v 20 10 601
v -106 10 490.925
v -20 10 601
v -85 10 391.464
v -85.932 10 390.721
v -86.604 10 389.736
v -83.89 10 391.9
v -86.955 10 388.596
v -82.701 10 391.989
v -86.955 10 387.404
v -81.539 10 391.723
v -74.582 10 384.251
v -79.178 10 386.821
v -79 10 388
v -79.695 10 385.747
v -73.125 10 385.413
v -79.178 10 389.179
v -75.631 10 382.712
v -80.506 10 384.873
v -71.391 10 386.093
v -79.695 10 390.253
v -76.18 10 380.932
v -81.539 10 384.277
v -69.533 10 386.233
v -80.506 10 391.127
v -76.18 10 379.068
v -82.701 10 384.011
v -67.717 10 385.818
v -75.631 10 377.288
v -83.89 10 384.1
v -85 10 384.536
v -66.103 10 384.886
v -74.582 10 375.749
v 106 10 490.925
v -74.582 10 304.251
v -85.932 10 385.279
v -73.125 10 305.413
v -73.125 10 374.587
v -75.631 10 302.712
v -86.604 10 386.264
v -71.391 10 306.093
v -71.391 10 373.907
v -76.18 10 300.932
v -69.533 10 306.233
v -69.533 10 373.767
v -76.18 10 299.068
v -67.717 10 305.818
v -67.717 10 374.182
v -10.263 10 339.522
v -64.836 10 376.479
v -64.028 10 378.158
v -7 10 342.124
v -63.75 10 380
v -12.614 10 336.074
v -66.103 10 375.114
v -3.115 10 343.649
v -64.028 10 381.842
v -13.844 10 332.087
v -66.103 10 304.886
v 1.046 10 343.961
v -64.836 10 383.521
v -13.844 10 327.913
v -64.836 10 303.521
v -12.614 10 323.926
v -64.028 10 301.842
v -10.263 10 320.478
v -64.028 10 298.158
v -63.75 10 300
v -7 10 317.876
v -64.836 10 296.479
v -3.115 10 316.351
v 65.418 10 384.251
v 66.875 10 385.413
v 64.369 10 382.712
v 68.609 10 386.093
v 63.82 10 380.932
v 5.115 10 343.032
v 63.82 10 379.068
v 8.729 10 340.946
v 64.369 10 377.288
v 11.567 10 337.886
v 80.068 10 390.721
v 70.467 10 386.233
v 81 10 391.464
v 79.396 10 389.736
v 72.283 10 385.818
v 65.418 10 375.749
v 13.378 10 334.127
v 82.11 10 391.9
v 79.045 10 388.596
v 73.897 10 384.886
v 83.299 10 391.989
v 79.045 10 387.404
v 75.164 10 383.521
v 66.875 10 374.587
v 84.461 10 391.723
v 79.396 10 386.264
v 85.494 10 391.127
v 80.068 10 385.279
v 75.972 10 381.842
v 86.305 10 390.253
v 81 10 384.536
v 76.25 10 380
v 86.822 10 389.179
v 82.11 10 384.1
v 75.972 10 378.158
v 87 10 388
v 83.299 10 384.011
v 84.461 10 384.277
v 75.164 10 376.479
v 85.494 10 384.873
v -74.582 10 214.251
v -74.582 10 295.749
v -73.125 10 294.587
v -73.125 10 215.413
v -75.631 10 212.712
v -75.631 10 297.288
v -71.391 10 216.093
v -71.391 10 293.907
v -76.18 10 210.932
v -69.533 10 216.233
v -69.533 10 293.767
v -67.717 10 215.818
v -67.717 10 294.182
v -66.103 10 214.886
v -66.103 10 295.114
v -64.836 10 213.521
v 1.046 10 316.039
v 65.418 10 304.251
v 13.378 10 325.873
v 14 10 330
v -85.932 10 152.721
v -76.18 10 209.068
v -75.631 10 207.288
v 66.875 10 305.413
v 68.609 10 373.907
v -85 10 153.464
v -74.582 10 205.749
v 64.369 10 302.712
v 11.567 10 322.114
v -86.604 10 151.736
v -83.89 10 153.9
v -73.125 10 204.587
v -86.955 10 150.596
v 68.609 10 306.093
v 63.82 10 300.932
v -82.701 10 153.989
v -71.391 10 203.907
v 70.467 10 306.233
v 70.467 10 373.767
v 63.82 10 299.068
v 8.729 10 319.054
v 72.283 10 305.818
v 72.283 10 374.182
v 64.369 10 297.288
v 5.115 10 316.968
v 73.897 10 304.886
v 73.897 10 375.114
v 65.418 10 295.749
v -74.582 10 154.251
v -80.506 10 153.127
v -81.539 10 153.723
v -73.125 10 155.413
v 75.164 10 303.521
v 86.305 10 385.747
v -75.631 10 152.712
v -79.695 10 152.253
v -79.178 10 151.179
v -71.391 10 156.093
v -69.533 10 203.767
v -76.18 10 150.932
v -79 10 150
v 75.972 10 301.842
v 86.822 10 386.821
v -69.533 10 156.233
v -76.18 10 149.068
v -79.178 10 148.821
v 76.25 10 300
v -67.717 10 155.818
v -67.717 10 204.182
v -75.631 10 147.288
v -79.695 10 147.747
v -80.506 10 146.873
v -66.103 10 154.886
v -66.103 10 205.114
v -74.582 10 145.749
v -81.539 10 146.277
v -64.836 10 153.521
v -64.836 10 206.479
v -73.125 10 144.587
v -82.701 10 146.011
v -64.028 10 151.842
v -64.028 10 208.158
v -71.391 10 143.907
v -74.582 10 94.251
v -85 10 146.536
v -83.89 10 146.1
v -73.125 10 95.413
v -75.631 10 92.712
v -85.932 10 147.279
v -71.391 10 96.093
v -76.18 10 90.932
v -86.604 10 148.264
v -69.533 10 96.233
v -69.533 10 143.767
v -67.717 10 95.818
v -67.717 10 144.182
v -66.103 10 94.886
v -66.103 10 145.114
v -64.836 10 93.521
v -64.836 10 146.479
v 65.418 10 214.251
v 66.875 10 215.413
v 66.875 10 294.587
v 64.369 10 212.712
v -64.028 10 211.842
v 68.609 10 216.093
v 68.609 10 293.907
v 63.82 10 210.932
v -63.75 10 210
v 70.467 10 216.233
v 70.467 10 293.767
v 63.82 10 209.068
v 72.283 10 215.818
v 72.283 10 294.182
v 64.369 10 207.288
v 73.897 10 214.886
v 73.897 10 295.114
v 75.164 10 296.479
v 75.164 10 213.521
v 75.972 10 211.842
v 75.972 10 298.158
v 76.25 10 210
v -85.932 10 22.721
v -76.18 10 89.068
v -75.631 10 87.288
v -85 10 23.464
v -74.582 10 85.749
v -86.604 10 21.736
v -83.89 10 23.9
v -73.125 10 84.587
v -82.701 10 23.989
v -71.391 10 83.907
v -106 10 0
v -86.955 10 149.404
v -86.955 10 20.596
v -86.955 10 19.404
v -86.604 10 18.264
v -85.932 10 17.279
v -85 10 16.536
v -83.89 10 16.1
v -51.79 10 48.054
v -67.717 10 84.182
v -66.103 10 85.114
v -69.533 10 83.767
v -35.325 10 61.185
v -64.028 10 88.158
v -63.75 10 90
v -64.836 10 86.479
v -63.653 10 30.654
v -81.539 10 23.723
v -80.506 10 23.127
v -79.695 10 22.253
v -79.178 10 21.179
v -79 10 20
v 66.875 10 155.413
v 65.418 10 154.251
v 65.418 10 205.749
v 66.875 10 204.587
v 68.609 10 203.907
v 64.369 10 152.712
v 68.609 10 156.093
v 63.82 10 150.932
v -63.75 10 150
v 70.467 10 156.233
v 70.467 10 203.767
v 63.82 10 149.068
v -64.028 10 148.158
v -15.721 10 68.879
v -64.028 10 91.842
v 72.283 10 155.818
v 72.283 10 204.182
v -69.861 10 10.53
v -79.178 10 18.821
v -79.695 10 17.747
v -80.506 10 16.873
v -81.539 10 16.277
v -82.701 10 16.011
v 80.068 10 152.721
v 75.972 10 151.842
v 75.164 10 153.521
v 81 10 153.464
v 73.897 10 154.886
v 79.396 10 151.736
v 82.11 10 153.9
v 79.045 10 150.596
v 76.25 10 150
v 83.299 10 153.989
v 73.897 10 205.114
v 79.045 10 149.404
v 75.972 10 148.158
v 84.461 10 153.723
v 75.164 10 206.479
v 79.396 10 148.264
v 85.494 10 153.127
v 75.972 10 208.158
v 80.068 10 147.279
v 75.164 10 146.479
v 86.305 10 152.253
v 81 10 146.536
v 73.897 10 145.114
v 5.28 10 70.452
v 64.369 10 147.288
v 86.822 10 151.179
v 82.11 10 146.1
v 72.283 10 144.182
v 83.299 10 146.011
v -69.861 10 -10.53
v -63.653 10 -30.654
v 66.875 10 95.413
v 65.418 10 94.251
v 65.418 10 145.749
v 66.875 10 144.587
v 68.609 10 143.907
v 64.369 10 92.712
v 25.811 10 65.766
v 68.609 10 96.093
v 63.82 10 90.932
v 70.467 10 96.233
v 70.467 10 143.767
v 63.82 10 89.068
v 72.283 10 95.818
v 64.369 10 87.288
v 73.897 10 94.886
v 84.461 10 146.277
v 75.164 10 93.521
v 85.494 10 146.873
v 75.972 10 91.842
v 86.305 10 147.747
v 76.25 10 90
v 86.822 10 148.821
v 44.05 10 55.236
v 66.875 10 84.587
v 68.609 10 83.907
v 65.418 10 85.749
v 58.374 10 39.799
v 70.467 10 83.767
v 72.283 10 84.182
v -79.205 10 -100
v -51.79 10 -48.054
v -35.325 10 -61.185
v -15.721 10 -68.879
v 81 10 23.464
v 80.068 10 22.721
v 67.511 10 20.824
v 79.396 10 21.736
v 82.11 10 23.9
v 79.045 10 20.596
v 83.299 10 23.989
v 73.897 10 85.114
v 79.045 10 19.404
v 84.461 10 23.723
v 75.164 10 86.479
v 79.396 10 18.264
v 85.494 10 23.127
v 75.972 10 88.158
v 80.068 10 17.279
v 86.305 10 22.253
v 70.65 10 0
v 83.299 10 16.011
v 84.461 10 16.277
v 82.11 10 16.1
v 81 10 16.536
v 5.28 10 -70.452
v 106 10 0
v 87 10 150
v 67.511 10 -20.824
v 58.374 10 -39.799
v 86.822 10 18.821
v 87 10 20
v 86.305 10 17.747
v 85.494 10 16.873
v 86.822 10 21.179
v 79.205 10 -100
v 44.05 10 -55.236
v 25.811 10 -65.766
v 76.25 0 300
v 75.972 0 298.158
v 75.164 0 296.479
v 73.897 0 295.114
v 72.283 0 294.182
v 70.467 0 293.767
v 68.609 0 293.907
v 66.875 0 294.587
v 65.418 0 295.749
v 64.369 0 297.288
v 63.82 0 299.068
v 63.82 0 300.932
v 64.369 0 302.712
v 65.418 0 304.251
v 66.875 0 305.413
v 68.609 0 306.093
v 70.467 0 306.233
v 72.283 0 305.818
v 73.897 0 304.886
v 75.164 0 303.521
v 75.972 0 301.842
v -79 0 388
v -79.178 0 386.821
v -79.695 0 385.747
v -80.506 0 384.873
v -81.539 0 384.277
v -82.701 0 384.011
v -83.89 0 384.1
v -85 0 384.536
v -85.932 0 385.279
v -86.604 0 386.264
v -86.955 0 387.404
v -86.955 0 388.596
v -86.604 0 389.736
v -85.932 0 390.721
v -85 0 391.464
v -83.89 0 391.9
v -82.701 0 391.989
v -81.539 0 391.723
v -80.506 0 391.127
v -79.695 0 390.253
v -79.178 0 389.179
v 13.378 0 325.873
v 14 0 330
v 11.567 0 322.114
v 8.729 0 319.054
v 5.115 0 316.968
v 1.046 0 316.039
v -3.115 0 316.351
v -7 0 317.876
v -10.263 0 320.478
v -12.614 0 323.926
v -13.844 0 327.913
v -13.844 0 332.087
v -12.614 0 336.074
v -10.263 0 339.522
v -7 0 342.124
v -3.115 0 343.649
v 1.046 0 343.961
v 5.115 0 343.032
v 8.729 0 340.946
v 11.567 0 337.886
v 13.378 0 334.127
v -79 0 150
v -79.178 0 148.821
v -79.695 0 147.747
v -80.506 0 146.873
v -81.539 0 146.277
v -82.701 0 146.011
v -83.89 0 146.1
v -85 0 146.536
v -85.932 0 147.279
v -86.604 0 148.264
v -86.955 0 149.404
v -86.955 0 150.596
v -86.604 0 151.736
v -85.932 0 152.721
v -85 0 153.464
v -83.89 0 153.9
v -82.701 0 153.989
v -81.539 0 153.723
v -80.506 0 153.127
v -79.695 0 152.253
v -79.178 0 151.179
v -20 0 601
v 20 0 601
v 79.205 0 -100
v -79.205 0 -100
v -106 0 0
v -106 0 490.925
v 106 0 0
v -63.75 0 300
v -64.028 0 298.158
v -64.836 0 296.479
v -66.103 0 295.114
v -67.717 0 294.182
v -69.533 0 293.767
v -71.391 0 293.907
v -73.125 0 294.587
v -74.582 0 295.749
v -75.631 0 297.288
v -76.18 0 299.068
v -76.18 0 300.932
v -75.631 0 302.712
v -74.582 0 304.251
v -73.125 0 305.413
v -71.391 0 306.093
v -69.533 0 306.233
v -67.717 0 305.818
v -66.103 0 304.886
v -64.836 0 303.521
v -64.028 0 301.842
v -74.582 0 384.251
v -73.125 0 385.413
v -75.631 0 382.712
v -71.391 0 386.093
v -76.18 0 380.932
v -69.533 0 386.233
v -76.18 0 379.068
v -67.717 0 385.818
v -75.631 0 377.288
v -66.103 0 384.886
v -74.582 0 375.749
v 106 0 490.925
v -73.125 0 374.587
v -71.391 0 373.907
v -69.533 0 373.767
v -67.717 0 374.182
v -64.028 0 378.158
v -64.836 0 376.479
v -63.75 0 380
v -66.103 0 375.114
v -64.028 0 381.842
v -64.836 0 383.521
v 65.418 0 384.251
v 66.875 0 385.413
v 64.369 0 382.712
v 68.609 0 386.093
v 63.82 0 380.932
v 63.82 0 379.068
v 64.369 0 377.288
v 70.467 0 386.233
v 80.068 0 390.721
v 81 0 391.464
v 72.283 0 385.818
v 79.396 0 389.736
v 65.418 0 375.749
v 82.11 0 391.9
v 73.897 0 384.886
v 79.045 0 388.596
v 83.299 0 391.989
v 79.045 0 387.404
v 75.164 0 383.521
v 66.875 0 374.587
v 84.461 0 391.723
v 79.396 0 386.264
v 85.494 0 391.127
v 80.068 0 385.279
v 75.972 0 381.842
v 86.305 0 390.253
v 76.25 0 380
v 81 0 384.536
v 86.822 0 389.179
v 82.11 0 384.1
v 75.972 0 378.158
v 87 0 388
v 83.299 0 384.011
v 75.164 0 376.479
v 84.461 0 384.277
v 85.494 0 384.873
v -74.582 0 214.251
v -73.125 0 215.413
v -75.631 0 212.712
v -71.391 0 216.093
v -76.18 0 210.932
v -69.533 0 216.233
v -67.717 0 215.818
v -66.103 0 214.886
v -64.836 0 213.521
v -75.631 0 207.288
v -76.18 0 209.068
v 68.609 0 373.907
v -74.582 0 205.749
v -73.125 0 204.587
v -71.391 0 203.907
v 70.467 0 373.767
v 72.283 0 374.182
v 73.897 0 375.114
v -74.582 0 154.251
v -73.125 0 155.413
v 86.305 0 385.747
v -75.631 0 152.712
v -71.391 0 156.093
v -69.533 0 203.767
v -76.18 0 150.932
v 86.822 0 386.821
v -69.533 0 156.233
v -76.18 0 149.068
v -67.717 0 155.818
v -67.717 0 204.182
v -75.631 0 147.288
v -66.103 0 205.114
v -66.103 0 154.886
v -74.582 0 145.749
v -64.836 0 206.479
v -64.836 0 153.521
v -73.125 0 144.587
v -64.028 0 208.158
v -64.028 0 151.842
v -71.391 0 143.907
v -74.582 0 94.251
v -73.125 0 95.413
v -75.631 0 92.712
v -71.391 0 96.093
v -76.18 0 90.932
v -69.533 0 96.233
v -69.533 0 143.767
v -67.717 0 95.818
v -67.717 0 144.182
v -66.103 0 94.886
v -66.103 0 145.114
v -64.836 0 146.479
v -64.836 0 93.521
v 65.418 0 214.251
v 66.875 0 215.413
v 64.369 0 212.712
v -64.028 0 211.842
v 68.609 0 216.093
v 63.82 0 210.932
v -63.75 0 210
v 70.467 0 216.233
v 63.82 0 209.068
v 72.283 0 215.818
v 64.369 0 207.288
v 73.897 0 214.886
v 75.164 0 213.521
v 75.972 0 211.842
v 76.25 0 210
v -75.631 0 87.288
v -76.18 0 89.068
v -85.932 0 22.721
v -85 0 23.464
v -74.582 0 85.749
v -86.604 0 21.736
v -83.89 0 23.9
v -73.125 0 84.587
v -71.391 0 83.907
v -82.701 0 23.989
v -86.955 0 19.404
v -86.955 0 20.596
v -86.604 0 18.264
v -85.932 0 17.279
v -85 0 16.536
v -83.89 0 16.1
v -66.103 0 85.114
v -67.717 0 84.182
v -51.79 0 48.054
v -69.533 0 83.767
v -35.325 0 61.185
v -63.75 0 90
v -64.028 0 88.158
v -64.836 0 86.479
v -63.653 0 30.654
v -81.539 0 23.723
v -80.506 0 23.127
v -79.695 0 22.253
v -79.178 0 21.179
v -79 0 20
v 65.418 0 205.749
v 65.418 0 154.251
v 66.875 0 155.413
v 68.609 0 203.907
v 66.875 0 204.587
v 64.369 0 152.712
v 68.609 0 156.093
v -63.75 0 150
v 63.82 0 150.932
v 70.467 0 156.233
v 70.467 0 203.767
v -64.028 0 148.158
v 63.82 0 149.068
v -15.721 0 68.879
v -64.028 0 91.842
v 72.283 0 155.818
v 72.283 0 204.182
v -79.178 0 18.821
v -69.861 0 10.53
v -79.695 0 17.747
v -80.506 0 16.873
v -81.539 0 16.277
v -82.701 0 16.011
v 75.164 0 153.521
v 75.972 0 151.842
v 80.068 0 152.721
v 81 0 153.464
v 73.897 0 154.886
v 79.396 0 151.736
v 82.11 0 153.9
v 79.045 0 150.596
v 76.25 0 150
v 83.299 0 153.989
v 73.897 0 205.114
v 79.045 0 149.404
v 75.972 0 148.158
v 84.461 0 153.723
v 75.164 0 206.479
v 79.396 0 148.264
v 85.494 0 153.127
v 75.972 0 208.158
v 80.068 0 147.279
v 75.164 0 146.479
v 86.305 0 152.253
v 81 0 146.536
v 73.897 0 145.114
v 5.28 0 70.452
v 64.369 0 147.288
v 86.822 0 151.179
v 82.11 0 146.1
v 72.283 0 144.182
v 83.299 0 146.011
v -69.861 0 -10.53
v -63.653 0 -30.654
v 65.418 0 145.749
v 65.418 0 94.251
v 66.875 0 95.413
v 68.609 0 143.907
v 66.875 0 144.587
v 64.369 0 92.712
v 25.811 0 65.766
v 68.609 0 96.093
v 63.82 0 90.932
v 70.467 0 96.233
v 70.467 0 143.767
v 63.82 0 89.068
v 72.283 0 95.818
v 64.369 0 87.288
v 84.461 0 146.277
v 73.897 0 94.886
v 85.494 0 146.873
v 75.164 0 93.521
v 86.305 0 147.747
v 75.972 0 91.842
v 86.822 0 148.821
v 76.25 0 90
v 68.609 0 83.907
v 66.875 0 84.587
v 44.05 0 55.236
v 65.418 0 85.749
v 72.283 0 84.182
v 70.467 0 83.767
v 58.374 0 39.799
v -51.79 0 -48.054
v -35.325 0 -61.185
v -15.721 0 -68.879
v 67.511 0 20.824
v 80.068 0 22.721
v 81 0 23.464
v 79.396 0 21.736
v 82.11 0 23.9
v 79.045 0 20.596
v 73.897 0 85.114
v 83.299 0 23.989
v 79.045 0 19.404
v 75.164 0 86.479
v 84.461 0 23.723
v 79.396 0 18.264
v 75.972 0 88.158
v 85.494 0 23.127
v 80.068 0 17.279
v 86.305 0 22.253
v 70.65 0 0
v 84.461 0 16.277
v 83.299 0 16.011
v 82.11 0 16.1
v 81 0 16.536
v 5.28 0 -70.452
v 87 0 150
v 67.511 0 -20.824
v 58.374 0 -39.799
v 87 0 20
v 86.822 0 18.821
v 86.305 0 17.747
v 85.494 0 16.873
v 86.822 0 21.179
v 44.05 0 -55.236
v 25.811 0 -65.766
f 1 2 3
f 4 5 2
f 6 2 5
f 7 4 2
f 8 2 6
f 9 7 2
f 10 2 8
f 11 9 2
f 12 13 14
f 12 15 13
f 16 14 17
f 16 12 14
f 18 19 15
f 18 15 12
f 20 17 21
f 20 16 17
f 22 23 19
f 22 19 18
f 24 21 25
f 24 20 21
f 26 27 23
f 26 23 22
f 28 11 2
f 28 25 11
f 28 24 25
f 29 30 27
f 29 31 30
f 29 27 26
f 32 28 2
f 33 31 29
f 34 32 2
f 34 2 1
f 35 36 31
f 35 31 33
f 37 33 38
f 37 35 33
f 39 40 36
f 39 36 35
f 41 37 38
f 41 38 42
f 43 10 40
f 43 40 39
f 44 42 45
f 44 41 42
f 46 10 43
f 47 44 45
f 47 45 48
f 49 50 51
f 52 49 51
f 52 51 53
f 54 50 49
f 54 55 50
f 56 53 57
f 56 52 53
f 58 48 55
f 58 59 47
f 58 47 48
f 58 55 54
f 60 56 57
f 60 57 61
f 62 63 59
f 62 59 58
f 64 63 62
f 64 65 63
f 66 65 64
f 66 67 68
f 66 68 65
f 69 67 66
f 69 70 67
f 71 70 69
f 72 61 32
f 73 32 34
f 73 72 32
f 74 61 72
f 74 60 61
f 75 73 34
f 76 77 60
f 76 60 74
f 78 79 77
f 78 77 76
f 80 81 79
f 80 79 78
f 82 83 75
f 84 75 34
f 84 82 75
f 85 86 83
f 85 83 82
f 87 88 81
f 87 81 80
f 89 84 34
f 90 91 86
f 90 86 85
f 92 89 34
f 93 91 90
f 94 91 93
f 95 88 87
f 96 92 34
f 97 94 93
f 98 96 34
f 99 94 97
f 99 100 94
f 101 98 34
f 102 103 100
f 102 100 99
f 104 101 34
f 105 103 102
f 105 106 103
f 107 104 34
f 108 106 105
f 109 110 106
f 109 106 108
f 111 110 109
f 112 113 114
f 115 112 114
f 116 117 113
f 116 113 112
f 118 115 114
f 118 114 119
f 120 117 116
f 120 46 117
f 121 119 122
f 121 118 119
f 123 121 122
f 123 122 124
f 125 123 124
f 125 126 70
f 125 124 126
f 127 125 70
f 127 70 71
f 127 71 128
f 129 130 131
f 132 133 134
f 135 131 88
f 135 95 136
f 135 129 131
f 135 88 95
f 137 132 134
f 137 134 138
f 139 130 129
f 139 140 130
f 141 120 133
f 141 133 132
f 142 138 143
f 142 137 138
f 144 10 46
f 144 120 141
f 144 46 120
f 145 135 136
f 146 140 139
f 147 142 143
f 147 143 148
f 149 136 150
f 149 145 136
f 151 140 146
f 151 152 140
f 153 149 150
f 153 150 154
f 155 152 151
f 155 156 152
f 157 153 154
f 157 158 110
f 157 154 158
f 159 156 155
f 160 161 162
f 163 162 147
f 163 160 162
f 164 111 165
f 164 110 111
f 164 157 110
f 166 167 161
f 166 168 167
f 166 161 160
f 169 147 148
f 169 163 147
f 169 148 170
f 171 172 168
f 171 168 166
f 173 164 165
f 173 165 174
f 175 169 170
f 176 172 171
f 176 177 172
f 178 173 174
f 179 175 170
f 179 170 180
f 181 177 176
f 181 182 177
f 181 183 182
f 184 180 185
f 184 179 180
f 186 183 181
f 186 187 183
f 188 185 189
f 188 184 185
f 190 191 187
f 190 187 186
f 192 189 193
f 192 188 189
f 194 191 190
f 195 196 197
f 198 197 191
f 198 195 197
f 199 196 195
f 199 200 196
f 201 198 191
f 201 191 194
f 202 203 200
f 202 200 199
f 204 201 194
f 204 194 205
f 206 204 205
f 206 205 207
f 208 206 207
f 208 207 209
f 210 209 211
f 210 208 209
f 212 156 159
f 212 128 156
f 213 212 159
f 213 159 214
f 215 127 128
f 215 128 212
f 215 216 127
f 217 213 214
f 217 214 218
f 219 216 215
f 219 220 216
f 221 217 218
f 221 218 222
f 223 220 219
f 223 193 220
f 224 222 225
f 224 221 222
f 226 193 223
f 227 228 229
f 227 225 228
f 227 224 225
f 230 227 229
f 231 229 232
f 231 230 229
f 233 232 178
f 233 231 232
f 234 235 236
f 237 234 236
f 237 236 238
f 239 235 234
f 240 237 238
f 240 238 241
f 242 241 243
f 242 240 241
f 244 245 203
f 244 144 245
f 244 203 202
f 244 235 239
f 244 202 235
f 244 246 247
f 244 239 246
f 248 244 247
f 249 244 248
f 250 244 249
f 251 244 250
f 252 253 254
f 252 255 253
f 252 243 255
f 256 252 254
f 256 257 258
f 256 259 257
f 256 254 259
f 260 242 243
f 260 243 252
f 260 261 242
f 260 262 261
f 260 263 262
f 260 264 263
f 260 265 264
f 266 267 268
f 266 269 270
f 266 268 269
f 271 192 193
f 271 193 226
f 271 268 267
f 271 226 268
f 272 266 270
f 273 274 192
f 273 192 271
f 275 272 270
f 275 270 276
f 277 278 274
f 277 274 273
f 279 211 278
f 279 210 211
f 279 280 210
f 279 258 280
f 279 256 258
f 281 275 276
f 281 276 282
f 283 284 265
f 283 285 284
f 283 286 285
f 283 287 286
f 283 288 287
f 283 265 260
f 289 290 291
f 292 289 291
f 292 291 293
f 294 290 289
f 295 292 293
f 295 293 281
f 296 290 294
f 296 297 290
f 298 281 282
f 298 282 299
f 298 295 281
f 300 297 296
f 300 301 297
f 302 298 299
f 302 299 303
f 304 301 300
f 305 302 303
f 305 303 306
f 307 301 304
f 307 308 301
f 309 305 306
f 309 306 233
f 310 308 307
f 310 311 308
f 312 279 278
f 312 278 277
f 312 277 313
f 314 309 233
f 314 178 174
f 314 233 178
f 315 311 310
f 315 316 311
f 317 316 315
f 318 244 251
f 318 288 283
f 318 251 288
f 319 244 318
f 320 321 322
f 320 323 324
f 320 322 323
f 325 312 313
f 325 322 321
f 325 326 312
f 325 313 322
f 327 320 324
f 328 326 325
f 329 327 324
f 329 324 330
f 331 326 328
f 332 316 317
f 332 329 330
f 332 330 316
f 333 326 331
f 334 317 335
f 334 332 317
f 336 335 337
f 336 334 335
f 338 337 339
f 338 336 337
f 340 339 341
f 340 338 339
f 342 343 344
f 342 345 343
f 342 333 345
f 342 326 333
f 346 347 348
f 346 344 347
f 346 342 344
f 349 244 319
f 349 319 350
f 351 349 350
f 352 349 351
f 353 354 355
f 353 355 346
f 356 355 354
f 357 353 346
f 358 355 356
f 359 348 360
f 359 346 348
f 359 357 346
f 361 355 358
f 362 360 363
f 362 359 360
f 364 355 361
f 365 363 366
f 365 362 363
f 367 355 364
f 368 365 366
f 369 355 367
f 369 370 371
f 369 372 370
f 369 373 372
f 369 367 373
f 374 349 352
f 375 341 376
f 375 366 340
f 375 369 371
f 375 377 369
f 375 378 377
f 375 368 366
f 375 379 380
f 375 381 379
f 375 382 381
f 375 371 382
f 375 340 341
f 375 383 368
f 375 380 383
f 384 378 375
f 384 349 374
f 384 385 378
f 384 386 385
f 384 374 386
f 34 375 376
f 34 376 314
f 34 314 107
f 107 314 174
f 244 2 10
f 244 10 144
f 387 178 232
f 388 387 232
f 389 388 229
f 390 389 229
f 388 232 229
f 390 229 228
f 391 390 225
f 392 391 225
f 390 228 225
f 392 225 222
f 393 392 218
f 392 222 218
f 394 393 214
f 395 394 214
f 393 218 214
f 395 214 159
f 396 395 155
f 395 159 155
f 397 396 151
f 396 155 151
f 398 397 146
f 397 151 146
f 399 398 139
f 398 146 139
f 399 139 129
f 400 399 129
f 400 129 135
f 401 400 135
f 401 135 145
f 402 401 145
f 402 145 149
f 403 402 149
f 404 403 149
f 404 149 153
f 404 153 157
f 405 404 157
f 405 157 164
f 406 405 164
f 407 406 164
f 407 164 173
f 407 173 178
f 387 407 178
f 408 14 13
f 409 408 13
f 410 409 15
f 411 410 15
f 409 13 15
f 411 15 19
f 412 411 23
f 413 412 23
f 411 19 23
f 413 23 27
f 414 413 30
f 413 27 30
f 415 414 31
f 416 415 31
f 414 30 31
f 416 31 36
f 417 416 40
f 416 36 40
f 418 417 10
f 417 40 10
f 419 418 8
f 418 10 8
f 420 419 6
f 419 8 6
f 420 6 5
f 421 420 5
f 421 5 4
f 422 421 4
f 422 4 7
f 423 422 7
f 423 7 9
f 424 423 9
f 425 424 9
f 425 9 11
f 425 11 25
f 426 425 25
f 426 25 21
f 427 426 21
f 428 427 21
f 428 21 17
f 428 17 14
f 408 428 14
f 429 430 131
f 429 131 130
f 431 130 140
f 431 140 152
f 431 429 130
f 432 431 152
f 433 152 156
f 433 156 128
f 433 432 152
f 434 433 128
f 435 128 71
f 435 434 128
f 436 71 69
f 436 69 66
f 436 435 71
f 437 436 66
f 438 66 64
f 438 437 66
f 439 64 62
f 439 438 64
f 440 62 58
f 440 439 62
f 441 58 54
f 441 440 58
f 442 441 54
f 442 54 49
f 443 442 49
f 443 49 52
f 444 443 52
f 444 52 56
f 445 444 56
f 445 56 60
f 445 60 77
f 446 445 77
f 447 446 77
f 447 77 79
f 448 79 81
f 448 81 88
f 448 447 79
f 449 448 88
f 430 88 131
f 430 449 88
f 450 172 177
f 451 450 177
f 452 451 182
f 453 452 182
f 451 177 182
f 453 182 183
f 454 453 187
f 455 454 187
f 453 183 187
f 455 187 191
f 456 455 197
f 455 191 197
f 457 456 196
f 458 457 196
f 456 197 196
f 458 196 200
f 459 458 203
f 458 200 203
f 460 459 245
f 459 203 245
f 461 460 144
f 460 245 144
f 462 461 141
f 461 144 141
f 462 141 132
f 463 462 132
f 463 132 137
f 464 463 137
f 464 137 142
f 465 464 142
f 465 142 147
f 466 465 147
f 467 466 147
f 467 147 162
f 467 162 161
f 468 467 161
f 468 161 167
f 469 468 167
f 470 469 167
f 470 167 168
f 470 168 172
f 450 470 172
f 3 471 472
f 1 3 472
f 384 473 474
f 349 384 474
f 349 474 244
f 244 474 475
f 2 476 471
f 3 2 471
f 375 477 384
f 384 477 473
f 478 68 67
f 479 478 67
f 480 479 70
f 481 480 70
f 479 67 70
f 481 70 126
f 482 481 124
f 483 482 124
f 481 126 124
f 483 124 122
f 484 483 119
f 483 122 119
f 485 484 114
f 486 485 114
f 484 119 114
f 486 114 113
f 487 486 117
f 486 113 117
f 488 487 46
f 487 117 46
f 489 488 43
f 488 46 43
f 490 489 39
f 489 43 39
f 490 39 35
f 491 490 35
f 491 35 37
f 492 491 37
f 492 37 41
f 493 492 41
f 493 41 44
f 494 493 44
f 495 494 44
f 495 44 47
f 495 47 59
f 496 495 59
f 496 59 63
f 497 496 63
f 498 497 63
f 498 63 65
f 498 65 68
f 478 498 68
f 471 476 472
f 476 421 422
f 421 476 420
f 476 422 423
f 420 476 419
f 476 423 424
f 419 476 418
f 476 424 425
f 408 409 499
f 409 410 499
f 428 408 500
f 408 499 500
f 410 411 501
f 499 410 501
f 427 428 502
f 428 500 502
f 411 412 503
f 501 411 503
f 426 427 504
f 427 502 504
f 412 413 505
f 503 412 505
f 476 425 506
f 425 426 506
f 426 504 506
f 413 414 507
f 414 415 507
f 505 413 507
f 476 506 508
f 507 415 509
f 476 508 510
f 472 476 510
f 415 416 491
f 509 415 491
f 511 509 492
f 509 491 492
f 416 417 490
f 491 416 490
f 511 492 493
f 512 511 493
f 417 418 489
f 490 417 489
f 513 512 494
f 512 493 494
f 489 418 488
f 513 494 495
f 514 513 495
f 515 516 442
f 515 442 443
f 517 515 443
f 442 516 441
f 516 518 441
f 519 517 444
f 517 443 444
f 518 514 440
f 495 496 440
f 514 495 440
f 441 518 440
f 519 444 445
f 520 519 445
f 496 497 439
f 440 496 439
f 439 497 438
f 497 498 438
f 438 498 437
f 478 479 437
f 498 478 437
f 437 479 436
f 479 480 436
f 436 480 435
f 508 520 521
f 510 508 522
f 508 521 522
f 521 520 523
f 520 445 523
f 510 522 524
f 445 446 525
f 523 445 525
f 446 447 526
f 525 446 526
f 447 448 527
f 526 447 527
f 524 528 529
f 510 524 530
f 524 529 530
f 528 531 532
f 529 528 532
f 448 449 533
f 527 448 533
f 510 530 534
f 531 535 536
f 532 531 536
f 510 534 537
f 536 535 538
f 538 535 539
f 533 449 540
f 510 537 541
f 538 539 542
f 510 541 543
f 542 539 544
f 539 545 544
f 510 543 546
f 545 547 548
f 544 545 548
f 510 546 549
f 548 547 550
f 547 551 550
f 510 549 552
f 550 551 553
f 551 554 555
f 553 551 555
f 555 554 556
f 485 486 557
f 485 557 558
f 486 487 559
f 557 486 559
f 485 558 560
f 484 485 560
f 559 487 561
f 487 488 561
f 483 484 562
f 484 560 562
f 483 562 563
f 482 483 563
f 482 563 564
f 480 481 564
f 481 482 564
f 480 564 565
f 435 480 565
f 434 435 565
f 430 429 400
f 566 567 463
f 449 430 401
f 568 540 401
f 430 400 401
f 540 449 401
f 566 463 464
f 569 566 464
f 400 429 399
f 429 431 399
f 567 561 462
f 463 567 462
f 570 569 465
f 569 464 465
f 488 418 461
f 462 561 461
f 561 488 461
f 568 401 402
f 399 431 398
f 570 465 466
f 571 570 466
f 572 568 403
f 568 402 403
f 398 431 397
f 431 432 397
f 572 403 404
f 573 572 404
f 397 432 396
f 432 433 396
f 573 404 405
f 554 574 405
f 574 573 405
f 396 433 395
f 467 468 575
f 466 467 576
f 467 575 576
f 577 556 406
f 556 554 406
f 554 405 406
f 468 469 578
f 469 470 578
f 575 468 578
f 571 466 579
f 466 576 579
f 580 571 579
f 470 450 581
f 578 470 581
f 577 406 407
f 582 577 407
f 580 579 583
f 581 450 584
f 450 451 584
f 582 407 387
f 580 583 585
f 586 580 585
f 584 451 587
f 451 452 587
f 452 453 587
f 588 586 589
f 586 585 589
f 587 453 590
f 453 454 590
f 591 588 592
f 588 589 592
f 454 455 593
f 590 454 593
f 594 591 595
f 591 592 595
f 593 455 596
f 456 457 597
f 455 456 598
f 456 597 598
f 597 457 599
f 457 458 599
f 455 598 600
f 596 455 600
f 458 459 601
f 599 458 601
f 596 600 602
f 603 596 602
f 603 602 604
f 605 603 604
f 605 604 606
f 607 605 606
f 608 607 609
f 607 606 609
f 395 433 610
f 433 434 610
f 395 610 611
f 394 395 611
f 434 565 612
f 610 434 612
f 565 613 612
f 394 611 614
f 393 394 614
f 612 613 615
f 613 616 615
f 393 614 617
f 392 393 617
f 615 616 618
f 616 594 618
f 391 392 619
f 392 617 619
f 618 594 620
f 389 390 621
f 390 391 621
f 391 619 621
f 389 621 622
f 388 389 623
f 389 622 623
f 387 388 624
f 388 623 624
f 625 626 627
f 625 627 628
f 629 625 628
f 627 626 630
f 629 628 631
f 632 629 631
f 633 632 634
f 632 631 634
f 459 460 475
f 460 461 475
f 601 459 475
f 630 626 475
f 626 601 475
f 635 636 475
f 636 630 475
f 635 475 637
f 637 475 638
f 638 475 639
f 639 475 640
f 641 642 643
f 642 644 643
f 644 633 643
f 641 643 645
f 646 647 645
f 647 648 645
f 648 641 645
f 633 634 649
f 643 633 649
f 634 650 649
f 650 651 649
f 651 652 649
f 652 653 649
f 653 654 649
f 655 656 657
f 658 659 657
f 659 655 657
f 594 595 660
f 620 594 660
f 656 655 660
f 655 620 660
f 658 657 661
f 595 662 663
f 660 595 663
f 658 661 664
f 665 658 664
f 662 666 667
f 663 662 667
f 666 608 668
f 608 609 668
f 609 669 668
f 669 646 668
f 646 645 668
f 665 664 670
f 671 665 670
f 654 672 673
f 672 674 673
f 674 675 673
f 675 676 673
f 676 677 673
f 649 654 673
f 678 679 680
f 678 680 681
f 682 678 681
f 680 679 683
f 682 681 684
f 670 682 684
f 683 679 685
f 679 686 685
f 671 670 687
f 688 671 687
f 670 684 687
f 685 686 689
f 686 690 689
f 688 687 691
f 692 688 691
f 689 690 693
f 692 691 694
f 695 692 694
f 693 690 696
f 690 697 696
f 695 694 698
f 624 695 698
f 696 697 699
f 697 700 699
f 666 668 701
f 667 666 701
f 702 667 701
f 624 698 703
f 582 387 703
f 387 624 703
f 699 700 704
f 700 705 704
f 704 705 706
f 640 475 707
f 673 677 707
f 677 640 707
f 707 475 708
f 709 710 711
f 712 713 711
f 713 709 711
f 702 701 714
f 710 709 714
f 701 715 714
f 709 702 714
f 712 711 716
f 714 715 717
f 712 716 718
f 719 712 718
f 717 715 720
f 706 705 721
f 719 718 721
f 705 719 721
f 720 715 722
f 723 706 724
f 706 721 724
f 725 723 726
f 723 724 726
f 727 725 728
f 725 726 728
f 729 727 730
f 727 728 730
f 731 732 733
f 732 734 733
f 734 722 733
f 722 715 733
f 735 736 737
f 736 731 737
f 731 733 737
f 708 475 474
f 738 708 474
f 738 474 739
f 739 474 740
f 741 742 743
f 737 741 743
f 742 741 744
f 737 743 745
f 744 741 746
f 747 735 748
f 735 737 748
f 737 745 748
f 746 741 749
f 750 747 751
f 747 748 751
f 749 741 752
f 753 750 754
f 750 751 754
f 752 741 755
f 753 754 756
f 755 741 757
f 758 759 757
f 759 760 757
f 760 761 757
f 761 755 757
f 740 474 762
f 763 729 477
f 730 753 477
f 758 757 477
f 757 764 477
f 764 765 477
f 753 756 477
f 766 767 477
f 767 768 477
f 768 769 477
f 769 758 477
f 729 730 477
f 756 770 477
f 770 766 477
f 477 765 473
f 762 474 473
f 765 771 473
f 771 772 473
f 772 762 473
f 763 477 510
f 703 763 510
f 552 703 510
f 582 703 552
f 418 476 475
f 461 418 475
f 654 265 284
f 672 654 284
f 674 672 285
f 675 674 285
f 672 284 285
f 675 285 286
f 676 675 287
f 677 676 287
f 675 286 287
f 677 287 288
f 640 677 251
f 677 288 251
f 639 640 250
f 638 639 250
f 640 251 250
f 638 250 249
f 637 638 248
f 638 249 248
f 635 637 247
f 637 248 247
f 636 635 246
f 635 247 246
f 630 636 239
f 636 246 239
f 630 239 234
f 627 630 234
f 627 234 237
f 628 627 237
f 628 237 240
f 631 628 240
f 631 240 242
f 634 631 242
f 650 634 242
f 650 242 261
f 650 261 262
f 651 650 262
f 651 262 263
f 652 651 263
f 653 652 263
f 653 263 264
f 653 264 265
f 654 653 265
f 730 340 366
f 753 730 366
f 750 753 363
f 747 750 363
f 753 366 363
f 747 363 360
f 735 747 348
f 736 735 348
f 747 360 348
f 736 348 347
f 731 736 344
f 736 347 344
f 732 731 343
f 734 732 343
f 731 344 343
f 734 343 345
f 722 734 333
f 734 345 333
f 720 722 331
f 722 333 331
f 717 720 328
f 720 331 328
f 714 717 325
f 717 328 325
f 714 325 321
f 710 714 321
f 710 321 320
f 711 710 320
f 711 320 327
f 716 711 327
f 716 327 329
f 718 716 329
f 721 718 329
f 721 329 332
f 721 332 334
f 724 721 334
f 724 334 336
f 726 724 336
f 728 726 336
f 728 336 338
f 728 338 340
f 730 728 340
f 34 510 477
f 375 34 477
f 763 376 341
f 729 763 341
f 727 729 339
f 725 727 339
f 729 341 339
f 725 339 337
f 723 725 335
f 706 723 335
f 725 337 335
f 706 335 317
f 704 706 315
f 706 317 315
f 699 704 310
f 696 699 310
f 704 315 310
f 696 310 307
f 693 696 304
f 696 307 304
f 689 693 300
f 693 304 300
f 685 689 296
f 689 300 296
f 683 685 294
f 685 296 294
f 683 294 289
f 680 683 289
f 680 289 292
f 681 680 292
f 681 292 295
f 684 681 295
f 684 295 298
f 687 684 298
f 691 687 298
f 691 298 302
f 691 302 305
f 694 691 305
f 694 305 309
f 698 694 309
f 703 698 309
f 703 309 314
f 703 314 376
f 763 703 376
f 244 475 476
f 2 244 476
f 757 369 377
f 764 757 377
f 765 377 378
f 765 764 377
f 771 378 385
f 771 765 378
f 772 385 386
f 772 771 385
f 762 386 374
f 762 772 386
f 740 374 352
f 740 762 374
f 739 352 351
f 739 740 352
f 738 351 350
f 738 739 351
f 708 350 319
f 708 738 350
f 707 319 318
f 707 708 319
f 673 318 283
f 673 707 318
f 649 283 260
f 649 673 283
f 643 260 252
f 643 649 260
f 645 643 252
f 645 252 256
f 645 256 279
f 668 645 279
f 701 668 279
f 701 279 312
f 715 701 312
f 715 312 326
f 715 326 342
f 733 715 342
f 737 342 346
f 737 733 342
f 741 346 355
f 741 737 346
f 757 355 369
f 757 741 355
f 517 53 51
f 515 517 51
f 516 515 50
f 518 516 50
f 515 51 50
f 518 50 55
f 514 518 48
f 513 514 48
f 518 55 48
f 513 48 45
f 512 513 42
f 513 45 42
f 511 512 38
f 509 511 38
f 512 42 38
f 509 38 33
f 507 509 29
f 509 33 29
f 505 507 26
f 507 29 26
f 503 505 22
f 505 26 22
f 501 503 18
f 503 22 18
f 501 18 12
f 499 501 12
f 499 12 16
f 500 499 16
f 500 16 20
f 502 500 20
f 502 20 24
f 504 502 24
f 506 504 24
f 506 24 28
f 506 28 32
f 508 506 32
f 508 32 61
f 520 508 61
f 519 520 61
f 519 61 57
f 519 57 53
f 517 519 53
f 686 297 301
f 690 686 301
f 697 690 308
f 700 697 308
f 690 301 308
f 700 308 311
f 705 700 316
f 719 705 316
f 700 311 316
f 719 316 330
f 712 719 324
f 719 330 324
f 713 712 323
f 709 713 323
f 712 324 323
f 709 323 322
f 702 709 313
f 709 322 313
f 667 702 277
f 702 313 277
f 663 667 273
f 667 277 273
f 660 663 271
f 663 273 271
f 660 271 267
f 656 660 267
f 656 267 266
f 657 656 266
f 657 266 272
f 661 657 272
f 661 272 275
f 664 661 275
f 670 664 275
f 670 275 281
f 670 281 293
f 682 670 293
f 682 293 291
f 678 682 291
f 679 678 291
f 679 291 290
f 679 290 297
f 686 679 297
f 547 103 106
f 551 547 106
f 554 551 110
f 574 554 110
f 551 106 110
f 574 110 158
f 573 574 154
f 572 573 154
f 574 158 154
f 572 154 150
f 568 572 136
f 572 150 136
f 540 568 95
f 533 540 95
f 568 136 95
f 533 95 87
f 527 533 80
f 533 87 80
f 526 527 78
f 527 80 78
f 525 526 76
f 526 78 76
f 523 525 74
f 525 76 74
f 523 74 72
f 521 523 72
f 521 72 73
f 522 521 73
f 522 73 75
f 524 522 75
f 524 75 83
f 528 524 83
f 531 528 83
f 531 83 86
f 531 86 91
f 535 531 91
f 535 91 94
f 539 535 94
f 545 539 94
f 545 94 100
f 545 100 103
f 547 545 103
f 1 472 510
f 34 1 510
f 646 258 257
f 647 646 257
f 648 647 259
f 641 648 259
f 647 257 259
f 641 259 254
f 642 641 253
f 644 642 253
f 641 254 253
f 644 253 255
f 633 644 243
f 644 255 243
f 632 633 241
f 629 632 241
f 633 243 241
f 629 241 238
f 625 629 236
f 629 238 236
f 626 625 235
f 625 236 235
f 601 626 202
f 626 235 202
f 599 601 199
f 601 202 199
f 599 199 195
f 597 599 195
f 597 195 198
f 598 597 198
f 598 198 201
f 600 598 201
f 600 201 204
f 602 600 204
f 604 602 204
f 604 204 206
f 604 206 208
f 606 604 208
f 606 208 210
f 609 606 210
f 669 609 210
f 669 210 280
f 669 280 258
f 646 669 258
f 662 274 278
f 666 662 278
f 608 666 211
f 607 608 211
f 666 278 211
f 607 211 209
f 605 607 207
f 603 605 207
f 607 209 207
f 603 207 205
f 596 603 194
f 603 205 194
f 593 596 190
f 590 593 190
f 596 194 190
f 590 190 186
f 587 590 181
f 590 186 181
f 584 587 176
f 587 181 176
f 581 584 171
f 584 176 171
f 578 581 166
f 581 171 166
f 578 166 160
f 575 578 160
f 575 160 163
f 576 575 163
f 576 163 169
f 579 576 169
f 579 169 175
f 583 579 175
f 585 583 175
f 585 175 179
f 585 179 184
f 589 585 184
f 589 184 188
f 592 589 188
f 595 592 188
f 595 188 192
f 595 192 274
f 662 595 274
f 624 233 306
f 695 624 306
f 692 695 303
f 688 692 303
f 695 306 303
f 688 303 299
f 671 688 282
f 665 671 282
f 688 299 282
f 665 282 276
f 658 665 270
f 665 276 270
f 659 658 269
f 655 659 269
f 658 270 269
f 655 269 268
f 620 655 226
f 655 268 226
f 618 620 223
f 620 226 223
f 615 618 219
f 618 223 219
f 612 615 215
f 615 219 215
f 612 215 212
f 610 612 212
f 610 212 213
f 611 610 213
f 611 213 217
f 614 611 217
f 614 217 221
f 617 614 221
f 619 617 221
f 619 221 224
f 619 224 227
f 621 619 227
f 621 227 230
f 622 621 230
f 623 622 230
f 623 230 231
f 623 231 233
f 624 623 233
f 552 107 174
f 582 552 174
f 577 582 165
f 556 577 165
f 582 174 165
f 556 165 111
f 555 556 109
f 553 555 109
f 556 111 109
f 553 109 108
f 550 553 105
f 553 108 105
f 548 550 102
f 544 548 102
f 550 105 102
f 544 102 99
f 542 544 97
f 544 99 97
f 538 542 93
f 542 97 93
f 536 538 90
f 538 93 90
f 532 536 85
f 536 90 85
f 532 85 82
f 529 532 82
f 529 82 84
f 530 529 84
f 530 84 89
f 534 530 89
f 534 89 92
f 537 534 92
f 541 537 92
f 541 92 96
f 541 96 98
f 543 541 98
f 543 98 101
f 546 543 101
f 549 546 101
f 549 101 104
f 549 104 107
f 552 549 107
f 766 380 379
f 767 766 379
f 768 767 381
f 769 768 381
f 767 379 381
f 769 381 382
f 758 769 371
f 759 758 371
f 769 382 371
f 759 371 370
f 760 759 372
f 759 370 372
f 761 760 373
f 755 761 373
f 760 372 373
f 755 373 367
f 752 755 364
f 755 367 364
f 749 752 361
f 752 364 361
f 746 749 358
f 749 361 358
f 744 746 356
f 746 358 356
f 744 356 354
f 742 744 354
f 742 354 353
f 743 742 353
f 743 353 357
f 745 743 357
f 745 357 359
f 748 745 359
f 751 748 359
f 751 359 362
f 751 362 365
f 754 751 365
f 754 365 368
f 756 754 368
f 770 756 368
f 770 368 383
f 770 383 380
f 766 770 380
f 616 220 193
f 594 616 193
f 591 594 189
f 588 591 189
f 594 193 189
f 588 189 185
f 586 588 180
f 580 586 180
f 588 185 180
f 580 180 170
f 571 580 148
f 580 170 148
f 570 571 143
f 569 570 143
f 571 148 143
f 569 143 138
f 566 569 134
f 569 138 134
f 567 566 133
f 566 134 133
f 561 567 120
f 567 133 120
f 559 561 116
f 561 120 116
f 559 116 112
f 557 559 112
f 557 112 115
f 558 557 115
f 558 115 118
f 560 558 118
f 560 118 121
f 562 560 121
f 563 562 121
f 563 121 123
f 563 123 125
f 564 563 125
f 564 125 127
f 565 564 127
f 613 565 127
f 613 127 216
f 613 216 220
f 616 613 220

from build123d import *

# Parameters (mm, degrees)
SKETCH23_R          = 70.65
SKETCH23_R_2        = 14
BOSS_EXTRUDE3_DEPTH = 10
LO_BAT_HOP_SO_REACH = 12
SKETCH24_R          = 4
SKETCH24_R_2        = 6.25


with BuildPart() as part:
    # Sketch23 → Boss-Extrude3 (new body)
    with BuildSketch(Plane(origin=(0, 0, 0), x_dir=(1, 0, 0), z_dir=(0, 1, 0))):
        Polygon((106, -490.925019631), (106, 0), (79.205080757, 100), (-79.205080757, 100), (-106, 0), (-106, -490.925019631), (-20, -601), (20, -601), align=None)
        Circle(SKETCH23_R, mode=Mode.SUBTRACT)
        with Locations((0, -330)):
            Circle(SKETCH23_R_2, mode=Mode.SUBTRACT)
    extrude(amount=BOSS_EXTRUDE3_DEPTH)

    # Sketch24 → lo bat hop so (cut, up to next)
    with BuildSketch(Plane(origin=(0, 10, 0), x_dir=(1, 0, 0), z_dir=(0, 1, 0)), mode=Mode.PRIVATE) as lo_bat_hop_so_sk1:
        with Locations((-83, -150)):
            Circle(SKETCH24_R)
    lo_bat_hop_so_tool1 = extrude(lo_bat_hop_so_sk1.sketch, amount=-LO_BAT_HOP_SO_REACH, mode=Mode.PRIVATE) & part.part
    add(lo_bat_hop_so_tool1.solids().sort_by_distance((-83, 10, 150))[0], mode=Mode.SUBTRACT)
    # Sketch24 → lo bat hop so (cut, up to next)
    with BuildSketch(Plane(origin=(0, 10, 0), x_dir=(1, 0, 0), z_dir=(0, 1, 0)), mode=Mode.PRIVATE) as lo_bat_hop_so_sk2:
        with Locations((-83, -388)):
            Circle(SKETCH24_R)
    lo_bat_hop_so_tool2 = extrude(lo_bat_hop_so_sk2.sketch, amount=-LO_BAT_HOP_SO_REACH, mode=Mode.PRIVATE) & part.part
    add(lo_bat_hop_so_tool2.solids().sort_by_distance((-83, 10, 388))[0], mode=Mode.SUBTRACT)
    # Sketch24 → lo bat hop so (cut, up to next)
    with BuildSketch(Plane(origin=(0, 10, 0), x_dir=(1, 0, 0), z_dir=(0, 1, 0)), mode=Mode.PRIVATE) as lo_bat_hop_so_sk3:
        with Locations((83, -388)):
            Circle(SKETCH24_R)
    lo_bat_hop_so_tool3 = extrude(lo_bat_hop_so_sk3.sketch, amount=-LO_BAT_HOP_SO_REACH, mode=Mode.PRIVATE) & part.part
    add(lo_bat_hop_so_tool3.solids().sort_by_distance((83, 10, 388))[0], mode=Mode.SUBTRACT)
    # Sketch24 → lo bat hop so (cut, up to next)
    with BuildSketch(Plane(origin=(0, 10, 0), x_dir=(1, 0, 0), z_dir=(0, 1, 0)), mode=Mode.PRIVATE) as lo_bat_hop_so_sk4:
        with Locations((83, -150)):
            Circle(SKETCH24_R)
    lo_bat_hop_so_tool4 = extrude(lo_bat_hop_so_sk4.sketch, amount=-LO_BAT_HOP_SO_REACH, mode=Mode.PRIVATE) & part.part
    add(lo_bat_hop_so_tool4.solids().sort_by_distance((83, 10, 150))[0], mode=Mode.SUBTRACT)
    # Sketch24 → lo bat hop so (cut, up to next)
    with BuildSketch(Plane(origin=(0, 10, 0), x_dir=(1, 0, 0), z_dir=(0, 1, 0)), mode=Mode.PRIVATE) as lo_bat_hop_so_sk5:
        with Locations((-83, -20)):
            Circle(SKETCH24_R)
    lo_bat_hop_so_tool5 = extrude(lo_bat_hop_so_sk5.sketch, amount=-LO_BAT_HOP_SO_REACH, mode=Mode.PRIVATE) & part.part
    add(lo_bat_hop_so_tool5.solids().sort_by_distance((-83, 10, 20))[0], mode=Mode.SUBTRACT)
    # Sketch24 → lo bat hop so (cut, up to next)
    with BuildSketch(Plane(origin=(0, 10, 0), x_dir=(1, 0, 0), z_dir=(0, 1, 0)), mode=Mode.PRIVATE) as lo_bat_hop_so_sk6:
        with Locations((83, -20)):
            Circle(SKETCH24_R)
    lo_bat_hop_so_tool6 = extrude(lo_bat_hop_so_sk6.sketch, amount=-LO_BAT_HOP_SO_REACH, mode=Mode.PRIVATE) & part.part
    add(lo_bat_hop_so_tool6.solids().sort_by_distance((83, 10, 20))[0], mode=Mode.SUBTRACT)
    # Sketch24 → lo bat hop so (cut, up to next)
    with BuildSketch(Plane(origin=(0, 10, 0), x_dir=(1, 0, 0), z_dir=(0, 1, 0)), mode=Mode.PRIVATE) as lo_bat_hop_so_sk7:
        with Locations((-70, -380)):
            Circle(SKETCH24_R_2)
    lo_bat_hop_so_tool7 = extrude(lo_bat_hop_so_sk7.sketch, amount=-LO_BAT_HOP_SO_REACH, mode=Mode.PRIVATE) & part.part
    add(lo_bat_hop_so_tool7.solids().sort_by_distance((-70, 10, 380))[0], mode=Mode.SUBTRACT)
    # Sketch24 → lo bat hop so (cut, up to next)
    with BuildSketch(Plane(origin=(0, 10, 0), x_dir=(1, 0, 0), z_dir=(0, 1, 0)), mode=Mode.PRIVATE) as lo_bat_hop_so_sk8:
        with Locations((-70, -300)):
            Circle(SKETCH24_R_2)
    lo_bat_hop_so_tool8 = extrude(lo_bat_hop_so_sk8.sketch, amount=-LO_BAT_HOP_SO_REACH, mode=Mode.PRIVATE) & part.part
    add(lo_bat_hop_so_tool8.solids().sort_by_distance((-70, 10, 300))[0], mode=Mode.SUBTRACT)
    # Sketch24 → lo bat hop so (cut, up to next)
    with BuildSketch(Plane(origin=(0, 10, 0), x_dir=(1, 0, 0), z_dir=(0, 1, 0)), mode=Mode.PRIVATE) as lo_bat_hop_so_sk9:
        with Locations((-70, -210)):
            Circle(SKETCH24_R_2)
    lo_bat_hop_so_tool9 = extrude(lo_bat_hop_so_sk9.sketch, amount=-LO_BAT_HOP_SO_REACH, mode=Mode.PRIVATE) & part.part
    add(lo_bat_hop_so_tool9.solids().sort_by_distance((-70, 10, 210))[0], mode=Mode.SUBTRACT)
    # Sketch24 → lo bat hop so (cut, up to next)
    with BuildSketch(Plane(origin=(0, 10, 0), x_dir=(1, 0, 0), z_dir=(0, 1, 0)), mode=Mode.PRIVATE) as lo_bat_hop_so_sk10:
        with Locations((-70, -150)):
            Circle(SKETCH24_R_2)
    lo_bat_hop_so_tool10 = extrude(lo_bat_hop_so_sk10.sketch, amount=-LO_BAT_HOP_SO_REACH, mode=Mode.PRIVATE) & part.part
    add(lo_bat_hop_so_tool10.solids().sort_by_distance((-70, 10, 150))[0], mode=Mode.SUBTRACT)
    # Sketch24 → lo bat hop so (cut, up to next)
    with BuildSketch(Plane(origin=(0, 10, 0), x_dir=(1, 0, 0), z_dir=(0, 1, 0)), mode=Mode.PRIVATE) as lo_bat_hop_so_sk11:
        with Locations((-70, -90)):
            Circle(SKETCH24_R_2)
    lo_bat_hop_so_tool11 = extrude(lo_bat_hop_so_sk11.sketch, amount=-LO_BAT_HOP_SO_REACH, mode=Mode.PRIVATE) & part.part
    add(lo_bat_hop_so_tool11.solids().sort_by_distance((-70, 10, 90))[0], mode=Mode.SUBTRACT)
    # Sketch24 → lo bat hop so (cut, up to next)
    with BuildSketch(Plane(origin=(0, 10, 0), x_dir=(1, 0, 0), z_dir=(0, 1, 0)), mode=Mode.PRIVATE) as lo_bat_hop_so_sk12:
        with Locations((70, -90)):
            Circle(SKETCH24_R_2)
    lo_bat_hop_so_tool12 = extrude(lo_bat_hop_so_sk12.sketch, amount=-LO_BAT_HOP_SO_REACH, mode=Mode.PRIVATE) & part.part
    add(lo_bat_hop_so_tool12.solids().sort_by_distance((70, 10, 90))[0], mode=Mode.SUBTRACT)
    # Sketch24 → lo bat hop so (cut, up to next)
    with BuildSketch(Plane(origin=(0, 10, 0), x_dir=(1, 0, 0), z_dir=(0, 1, 0)), mode=Mode.PRIVATE) as lo_bat_hop_so_sk13:
        with Locations((70, -150)):
            Circle(SKETCH24_R_2)
    lo_bat_hop_so_tool13 = extrude(lo_bat_hop_so_sk13.sketch, amount=-LO_BAT_HOP_SO_REACH, mode=Mode.PRIVATE) & part.part
    add(lo_bat_hop_so_tool13.solids().sort_by_distance((70, 10, 150))[0], mode=Mode.SUBTRACT)
    # Sketch24 → lo bat hop so (cut, up to next)
    with BuildSketch(Plane(origin=(0, 10, 0), x_dir=(1, 0, 0), z_dir=(0, 1, 0)), mode=Mode.PRIVATE) as lo_bat_hop_so_sk14:
        with Locations((70, -210)):
            Circle(SKETCH24_R_2)
    lo_bat_hop_so_tool14 = extrude(lo_bat_hop_so_sk14.sketch, amount=-LO_BAT_HOP_SO_REACH, mode=Mode.PRIVATE) & part.part
    add(lo_bat_hop_so_tool14.solids().sort_by_distance((70, 10, 210))[0], mode=Mode.SUBTRACT)
    # Sketch24 → lo bat hop so (cut, up to next)
    with BuildSketch(Plane(origin=(0, 10, 0), x_dir=(1, 0, 0), z_dir=(0, 1, 0)), mode=Mode.PRIVATE) as lo_bat_hop_so_sk15:
        with Locations((70, -300)):
            Circle(SKETCH24_R_2)
    lo_bat_hop_so_tool15 = extrude(lo_bat_hop_so_sk15.sketch, amount=-LO_BAT_HOP_SO_REACH, mode=Mode.PRIVATE) & part.part
    add(lo_bat_hop_so_tool15.solids().sort_by_distance((70, 10, 300))[0], mode=Mode.SUBTRACT)
    # Sketch24 → lo bat hop so (cut, up to next)
    with BuildSketch(Plane(origin=(0, 10, 0), x_dir=(1, 0, 0), z_dir=(0, 1, 0)), mode=Mode.PRIVATE) as lo_bat_hop_so_sk16:
        with Locations((70, -380)):
            Circle(SKETCH24_R_2)
    lo_bat_hop_so_tool16 = extrude(lo_bat_hop_so_sk16.sketch, amount=-LO_BAT_HOP_SO_REACH, mode=Mode.PRIVATE) & part.part
    add(lo_bat_hop_so_tool16.solids().sort_by_distance((70, 10, 380))[0], mode=Mode.SUBTRACT)


solid = part.part
